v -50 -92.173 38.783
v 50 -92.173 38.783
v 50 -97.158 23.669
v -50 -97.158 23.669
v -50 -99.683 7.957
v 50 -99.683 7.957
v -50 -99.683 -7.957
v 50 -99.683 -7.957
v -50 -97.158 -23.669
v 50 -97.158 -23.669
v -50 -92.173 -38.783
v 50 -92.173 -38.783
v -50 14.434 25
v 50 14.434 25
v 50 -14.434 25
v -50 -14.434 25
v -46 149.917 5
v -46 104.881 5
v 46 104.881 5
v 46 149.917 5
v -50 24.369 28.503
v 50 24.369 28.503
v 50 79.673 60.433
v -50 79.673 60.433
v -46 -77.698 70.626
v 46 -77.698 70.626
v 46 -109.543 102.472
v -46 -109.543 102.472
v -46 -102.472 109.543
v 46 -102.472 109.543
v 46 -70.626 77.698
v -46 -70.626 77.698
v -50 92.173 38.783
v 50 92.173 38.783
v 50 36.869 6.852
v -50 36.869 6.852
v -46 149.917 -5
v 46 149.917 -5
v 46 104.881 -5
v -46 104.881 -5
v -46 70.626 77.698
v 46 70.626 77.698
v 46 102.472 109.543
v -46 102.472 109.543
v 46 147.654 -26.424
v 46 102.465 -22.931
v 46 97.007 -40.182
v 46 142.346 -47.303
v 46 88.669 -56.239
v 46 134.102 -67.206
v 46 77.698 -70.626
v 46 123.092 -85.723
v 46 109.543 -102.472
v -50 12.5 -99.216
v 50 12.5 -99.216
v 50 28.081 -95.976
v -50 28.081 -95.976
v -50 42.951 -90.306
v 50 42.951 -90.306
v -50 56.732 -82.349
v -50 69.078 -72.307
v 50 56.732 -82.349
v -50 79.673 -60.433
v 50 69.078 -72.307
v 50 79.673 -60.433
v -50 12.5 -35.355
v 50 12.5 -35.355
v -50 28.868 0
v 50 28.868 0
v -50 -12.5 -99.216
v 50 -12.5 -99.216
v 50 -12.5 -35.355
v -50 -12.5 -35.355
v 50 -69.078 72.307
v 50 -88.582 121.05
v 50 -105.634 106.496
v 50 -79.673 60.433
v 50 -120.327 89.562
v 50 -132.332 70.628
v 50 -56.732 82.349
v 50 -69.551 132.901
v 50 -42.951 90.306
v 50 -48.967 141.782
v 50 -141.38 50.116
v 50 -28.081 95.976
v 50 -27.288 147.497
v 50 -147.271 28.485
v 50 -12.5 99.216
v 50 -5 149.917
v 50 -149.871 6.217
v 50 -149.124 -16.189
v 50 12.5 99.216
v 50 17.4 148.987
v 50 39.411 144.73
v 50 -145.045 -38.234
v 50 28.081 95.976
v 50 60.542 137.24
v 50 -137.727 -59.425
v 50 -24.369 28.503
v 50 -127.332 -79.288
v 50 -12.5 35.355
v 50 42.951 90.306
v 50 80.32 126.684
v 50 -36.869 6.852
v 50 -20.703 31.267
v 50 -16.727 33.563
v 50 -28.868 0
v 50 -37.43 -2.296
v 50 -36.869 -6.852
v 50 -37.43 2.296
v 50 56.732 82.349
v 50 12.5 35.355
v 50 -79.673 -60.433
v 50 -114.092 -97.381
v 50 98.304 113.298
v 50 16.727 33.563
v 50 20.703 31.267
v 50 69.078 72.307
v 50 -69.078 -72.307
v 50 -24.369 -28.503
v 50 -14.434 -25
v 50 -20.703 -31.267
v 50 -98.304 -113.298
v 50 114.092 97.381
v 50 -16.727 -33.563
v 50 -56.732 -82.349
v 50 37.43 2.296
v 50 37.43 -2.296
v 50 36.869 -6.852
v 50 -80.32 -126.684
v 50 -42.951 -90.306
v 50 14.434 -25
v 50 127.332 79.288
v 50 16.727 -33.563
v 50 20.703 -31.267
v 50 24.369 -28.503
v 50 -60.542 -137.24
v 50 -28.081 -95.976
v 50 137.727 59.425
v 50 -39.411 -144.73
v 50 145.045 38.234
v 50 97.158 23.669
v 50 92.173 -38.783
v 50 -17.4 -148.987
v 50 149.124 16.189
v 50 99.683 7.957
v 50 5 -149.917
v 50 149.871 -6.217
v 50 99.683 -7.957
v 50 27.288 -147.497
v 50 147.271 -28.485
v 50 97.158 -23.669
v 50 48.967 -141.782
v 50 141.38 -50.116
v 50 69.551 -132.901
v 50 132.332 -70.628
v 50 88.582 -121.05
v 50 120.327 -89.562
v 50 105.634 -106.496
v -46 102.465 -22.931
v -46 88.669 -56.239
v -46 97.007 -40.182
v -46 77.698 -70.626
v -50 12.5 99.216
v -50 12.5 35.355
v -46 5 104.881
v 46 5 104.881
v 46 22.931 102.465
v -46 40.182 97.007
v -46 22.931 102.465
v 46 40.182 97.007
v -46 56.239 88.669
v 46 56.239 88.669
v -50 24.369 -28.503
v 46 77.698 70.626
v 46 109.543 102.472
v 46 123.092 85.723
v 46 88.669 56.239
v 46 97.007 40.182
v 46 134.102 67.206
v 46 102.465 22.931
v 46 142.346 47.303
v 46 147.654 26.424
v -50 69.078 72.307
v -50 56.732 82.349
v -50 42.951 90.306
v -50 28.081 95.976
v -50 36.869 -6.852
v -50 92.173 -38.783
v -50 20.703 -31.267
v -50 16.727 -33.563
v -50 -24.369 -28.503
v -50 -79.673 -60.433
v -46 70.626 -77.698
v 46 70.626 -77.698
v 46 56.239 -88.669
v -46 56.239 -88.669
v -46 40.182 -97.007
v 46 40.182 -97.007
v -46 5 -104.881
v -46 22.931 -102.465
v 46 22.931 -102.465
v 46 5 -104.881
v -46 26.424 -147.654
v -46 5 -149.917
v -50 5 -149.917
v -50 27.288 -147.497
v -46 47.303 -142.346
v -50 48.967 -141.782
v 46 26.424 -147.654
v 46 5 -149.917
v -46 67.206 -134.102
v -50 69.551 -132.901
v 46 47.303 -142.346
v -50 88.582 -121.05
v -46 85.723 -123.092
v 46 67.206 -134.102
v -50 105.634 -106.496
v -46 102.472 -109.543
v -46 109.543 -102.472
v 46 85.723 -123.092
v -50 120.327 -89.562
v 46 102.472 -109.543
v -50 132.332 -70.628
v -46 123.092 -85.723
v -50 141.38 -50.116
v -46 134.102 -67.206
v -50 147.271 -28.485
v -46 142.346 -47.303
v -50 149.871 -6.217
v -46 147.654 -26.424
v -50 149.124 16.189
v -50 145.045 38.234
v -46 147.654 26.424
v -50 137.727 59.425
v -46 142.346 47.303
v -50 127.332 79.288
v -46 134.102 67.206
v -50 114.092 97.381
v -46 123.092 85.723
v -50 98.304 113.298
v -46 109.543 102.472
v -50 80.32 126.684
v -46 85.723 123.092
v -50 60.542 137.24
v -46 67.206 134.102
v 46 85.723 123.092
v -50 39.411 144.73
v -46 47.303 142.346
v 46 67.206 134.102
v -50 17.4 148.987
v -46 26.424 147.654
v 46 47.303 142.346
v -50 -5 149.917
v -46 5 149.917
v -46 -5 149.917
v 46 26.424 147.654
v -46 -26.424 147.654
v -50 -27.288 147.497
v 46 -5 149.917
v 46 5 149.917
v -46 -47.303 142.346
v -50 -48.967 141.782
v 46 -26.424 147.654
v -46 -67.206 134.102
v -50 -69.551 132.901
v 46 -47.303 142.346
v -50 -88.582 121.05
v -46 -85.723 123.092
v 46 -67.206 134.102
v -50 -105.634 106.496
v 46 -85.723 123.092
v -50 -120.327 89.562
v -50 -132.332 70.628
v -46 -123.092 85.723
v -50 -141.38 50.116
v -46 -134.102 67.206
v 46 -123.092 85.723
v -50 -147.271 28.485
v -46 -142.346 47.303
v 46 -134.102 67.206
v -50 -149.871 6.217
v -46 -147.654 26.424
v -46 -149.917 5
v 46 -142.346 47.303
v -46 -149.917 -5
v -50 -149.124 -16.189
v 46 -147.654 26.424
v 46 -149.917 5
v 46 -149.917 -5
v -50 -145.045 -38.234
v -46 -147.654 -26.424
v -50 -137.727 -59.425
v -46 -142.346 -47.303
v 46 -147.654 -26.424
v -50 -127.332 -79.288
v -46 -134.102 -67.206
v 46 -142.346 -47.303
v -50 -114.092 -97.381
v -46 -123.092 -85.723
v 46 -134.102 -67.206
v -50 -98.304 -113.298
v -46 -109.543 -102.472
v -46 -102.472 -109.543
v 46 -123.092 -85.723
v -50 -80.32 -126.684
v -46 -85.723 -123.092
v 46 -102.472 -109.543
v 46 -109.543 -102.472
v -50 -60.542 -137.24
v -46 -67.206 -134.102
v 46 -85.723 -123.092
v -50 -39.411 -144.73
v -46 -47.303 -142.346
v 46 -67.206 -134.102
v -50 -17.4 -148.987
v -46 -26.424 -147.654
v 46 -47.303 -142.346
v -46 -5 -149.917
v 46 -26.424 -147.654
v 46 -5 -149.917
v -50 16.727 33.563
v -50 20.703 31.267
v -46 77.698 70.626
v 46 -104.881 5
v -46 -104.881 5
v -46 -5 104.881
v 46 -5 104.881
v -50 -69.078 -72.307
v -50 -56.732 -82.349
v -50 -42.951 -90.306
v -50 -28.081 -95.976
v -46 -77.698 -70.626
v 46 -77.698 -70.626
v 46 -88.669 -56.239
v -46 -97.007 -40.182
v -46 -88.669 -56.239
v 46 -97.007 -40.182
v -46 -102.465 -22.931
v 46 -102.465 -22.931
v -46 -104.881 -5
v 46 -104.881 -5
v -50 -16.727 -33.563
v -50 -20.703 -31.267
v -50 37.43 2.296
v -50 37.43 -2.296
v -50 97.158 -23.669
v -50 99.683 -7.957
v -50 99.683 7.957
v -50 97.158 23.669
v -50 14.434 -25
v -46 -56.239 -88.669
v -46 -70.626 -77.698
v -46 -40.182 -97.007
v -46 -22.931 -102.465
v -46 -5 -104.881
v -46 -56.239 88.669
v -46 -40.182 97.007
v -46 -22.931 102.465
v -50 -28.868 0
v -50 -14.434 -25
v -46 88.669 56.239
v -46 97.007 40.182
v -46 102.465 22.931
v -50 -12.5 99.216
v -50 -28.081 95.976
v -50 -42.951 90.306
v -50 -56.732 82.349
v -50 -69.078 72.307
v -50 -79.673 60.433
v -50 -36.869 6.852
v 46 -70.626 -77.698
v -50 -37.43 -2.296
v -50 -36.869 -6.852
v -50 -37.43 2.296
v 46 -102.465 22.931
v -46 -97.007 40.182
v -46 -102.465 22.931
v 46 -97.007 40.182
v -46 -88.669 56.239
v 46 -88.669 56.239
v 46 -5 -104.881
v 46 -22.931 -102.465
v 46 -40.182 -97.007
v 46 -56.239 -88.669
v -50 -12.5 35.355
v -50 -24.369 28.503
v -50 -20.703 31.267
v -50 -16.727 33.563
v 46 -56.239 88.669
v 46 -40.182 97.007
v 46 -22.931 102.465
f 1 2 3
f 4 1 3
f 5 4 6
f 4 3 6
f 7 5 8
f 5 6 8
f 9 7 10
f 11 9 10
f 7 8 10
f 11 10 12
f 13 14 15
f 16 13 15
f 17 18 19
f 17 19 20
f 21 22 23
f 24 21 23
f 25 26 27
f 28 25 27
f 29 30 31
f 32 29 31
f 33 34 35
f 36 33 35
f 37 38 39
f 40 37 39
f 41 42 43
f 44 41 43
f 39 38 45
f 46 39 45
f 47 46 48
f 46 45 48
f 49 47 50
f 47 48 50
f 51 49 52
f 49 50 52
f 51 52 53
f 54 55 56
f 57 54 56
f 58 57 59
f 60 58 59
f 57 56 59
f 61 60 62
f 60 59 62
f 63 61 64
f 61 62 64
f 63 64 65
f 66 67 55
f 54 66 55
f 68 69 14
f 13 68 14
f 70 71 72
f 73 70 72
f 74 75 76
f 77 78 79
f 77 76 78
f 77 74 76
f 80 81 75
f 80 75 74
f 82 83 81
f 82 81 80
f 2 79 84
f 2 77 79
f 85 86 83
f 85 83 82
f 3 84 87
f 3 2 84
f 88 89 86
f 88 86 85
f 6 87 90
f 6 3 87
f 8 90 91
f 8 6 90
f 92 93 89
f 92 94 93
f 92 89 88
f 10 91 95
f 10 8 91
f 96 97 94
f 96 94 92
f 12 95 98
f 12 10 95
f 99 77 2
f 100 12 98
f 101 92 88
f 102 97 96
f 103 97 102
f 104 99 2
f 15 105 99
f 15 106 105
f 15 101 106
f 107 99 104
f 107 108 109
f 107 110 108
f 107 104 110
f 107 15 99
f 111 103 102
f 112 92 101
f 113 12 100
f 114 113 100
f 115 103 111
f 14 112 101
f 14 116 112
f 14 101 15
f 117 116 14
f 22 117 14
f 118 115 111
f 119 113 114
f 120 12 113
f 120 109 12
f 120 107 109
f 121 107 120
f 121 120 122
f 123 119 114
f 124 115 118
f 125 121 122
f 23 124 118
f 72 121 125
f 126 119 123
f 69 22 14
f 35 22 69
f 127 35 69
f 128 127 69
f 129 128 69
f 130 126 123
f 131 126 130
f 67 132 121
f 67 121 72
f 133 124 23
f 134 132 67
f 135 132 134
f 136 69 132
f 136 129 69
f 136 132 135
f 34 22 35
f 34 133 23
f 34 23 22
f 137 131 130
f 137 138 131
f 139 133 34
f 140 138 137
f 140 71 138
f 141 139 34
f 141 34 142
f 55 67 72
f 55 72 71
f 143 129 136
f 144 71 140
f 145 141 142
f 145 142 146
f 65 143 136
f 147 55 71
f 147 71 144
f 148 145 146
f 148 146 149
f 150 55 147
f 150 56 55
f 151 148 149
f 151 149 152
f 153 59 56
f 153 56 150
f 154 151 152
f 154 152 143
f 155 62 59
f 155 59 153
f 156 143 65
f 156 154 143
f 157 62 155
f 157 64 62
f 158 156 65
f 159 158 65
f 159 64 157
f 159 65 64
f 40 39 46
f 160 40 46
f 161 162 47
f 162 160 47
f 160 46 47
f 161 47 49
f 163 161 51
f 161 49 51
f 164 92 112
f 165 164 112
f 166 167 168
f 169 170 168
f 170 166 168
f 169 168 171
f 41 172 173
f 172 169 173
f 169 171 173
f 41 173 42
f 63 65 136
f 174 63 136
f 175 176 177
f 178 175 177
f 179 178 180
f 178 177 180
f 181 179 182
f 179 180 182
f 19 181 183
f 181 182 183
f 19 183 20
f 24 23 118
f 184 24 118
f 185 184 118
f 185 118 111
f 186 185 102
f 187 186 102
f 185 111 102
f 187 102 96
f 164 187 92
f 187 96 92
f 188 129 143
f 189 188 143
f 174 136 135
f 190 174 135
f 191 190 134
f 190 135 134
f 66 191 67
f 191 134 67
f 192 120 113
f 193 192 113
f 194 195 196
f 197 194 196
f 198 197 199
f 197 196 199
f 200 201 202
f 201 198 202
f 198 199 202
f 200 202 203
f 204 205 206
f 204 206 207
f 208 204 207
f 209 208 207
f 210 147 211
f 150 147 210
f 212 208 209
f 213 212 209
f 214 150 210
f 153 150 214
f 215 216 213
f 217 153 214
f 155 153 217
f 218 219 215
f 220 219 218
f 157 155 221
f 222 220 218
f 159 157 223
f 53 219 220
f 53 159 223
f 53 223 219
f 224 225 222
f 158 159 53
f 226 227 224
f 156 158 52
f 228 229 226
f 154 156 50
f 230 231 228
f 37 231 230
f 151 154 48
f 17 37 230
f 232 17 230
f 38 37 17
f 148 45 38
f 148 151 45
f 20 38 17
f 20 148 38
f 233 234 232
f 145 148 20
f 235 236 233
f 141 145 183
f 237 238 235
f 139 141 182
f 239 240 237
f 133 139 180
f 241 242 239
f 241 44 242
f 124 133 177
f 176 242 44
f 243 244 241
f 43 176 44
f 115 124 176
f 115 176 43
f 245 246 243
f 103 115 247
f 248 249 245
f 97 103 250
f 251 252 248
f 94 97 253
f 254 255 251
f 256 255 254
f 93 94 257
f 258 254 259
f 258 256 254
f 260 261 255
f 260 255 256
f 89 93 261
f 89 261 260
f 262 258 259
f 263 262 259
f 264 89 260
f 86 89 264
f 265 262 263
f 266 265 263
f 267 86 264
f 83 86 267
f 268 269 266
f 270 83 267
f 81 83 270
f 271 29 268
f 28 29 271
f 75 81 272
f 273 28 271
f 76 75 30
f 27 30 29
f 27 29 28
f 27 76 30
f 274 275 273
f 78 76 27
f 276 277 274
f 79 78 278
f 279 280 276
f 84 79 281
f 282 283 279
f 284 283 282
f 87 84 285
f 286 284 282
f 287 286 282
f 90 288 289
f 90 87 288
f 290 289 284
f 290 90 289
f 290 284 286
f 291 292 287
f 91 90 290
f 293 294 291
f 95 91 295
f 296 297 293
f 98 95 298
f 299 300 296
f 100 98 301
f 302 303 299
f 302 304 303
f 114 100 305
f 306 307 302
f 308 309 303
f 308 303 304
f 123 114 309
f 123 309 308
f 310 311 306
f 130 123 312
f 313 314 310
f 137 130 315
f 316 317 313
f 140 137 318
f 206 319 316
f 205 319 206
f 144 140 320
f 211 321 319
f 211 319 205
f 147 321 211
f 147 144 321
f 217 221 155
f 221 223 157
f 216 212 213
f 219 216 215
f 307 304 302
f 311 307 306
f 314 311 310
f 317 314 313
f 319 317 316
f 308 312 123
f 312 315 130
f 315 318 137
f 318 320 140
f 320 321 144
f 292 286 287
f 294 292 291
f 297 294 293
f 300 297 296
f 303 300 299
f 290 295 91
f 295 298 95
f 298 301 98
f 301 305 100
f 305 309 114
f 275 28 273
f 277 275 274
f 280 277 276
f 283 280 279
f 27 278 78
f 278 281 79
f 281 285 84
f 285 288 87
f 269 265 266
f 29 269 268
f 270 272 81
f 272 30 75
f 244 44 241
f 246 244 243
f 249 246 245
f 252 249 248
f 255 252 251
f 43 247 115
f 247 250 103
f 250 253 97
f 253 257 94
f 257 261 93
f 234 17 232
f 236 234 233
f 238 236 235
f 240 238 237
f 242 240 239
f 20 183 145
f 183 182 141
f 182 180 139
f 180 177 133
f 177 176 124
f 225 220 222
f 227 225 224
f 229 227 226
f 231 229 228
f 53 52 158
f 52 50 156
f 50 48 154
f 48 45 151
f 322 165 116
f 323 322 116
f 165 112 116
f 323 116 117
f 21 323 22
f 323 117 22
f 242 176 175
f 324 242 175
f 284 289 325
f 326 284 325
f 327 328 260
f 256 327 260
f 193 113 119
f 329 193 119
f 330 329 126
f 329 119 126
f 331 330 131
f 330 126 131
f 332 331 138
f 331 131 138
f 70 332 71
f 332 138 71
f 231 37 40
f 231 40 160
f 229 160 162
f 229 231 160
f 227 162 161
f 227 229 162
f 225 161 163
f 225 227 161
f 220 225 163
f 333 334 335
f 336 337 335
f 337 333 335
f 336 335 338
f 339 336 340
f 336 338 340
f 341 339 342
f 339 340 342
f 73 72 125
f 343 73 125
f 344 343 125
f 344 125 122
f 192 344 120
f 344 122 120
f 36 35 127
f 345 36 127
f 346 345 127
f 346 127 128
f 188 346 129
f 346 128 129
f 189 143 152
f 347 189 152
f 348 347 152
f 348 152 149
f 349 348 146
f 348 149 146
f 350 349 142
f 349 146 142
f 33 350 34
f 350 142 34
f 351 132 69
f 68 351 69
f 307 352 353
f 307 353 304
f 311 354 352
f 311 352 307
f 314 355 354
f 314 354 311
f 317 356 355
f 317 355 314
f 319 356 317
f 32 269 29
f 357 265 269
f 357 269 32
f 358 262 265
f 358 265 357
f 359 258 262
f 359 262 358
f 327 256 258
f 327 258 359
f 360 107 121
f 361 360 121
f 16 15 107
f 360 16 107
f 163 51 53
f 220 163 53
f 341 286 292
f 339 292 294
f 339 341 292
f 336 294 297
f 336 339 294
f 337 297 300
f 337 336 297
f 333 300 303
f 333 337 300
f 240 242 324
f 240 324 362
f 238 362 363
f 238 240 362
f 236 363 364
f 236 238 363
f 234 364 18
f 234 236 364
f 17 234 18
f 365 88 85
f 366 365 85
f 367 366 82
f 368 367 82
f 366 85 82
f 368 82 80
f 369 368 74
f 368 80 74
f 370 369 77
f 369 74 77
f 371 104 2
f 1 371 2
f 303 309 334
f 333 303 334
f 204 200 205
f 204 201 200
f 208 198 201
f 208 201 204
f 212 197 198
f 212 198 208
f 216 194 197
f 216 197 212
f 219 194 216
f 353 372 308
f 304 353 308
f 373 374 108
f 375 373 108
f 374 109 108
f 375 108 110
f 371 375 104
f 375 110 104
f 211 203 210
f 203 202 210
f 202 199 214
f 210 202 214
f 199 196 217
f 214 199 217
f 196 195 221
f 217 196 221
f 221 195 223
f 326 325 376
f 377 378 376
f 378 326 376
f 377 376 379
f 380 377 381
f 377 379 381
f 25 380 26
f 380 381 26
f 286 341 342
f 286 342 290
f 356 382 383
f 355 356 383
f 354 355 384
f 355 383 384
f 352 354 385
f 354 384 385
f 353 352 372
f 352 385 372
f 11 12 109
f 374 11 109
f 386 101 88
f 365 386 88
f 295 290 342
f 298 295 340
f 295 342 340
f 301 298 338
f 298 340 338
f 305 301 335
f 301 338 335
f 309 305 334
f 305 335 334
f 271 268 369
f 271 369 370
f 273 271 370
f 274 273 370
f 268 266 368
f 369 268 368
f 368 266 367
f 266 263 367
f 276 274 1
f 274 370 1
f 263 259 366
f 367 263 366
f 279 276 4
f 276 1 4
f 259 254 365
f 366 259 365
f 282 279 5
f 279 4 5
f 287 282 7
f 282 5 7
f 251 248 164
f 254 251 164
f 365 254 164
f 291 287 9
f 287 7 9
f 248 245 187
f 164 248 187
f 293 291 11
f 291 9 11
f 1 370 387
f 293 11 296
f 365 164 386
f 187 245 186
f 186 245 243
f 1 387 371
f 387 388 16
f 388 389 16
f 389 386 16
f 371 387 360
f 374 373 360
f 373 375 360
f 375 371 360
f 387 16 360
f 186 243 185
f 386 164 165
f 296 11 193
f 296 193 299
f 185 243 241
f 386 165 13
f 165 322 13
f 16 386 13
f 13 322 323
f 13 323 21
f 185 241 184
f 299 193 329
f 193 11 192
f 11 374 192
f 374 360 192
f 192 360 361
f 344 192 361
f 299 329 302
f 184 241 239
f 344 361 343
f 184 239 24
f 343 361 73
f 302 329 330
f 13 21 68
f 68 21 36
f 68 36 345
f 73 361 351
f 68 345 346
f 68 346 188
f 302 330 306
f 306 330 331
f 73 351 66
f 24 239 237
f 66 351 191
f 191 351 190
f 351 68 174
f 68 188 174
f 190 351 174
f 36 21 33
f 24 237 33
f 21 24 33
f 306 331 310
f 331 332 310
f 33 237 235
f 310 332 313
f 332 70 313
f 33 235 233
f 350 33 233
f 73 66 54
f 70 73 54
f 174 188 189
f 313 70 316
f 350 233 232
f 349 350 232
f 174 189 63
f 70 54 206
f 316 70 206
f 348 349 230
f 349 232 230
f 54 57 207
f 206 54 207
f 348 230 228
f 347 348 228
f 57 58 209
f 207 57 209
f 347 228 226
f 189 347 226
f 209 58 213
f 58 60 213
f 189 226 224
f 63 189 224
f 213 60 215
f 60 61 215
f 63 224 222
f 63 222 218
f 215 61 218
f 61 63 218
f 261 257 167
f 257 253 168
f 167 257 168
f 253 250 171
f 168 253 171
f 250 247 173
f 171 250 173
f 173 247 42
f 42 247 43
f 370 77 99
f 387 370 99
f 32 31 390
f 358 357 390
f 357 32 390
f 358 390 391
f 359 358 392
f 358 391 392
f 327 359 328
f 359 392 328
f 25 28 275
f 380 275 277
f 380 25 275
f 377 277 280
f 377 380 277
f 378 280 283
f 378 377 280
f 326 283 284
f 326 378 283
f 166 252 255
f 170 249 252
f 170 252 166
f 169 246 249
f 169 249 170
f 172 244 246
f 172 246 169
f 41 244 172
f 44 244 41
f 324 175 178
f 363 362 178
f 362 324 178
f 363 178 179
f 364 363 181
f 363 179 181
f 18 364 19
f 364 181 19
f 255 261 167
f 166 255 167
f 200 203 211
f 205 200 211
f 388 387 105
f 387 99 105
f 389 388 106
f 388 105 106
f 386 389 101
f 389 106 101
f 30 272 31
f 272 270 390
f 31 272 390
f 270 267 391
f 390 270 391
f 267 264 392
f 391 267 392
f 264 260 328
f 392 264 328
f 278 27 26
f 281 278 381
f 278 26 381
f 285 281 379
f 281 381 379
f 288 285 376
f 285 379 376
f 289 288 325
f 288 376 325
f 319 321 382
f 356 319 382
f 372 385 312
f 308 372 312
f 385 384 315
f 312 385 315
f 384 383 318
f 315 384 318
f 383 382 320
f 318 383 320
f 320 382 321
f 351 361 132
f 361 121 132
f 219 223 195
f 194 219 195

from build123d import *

# Parameters (mm, degrees)
BOSS_EXTRUDE1_DEPTH = 50
SKETCH4_R           = 150
SKETCH4_R_2         = 100
BOSS_EXTRUDE3_DEPTH = 100
CUT_EXTRUDE1_DEPTH  = 120
SKETCH7_R           = 150
SKETCH7_R_2         = 105
BOSS_EXTRUDE6_DEPTH = 4


with BuildPart() as part:
    # Sketch2 → Boss-Extrude1 (new, symmetric)
    with BuildSketch(Plane.YZ):
        with BuildLine():
            Line((-24.368621785, -28.502987077), (-80.352540378, -60.825317547))
            Line((-80.352540378, -60.825317547), (-92.852540378, -39.174682453))
            Line((-92.852540378, -39.174682453), (-36.868621785, -6.852351982))
            ThreePointArc((-36.868621785, -6.852351982), (-37.5, 0), (-36.868621785, 6.852351982))
            Line((-36.868621785, 6.852351982), (-92.852540378, 39.174682453))
            Line((-92.852540378, 39.174682453), (-80.352540378, 60.825317547))
            Line((-80.352540378, 60.825317547), (-24.368621785, 28.502987077))
            ThreePointArc((-24.368621785, 28.502987077), (-18.75, 32.475952642), (-12.5, 35.355339059))
            Line((-12.5, 35.355339059), (-12.5, 100))
            Line((-12.5, 100), (12.5, 100))
            Line((12.5, 100), (12.5, 35.355339059))
            ThreePointArc((12.5, 35.355339059), (18.75, 32.475952642), (24.368621785, 28.502987077))
            Line((24.368621785, 28.502987077), (80.352540378, 60.825317547))
            Line((80.352540378, 60.825317547), (92.852540378, 39.174682453))
            Line((92.852540378, 39.174682453), (36.868621785, 6.852351982))
            ThreePointArc((36.868621785, 6.852351982), (37.5, 0), (36.868621785, -6.852351982))
            Line((36.868621785, -6.852351982), (92.852540378, -39.174682453))
            Line((92.852540378, -39.174682453), (80.352540378, -60.825317547))
            Line((80.352540378, -60.825317547), (24.368621785, -28.502987077))
            ThreePointArc((24.368621785, -28.502987077), (18.75, -32.475952642), (12.5, -35.355339059))
            Line((12.5, -35.355339059), (12.5, -100))
            Line((12.5, -100), (-12.5, -100))
            Line((-12.5, -100), (-12.5, -35.355339059))
            ThreePointArc((-12.5, -35.355339059), (-18.75, -32.475952642), (-24.368621785, -28.502987077))
        make_face()
        Polygon((-14.43375673, -25), (14.43375673, -25), (28.867513459, 0), (14.43375673, 25), (-14.43375673, 25), (-28.867513459, 0), align=None, mode=Mode.SUBTRACT)
    extrude(amount=BOSS_EXTRUDE1_DEPTH, both=True)

    # Sketch4 → Boss-Extrude3 (add)
    with BuildSketch(Plane.YZ.offset(50)):
        with Locations(Location((0, 0, 0), (0, 0, 270))):
            Circle(SKETCH4_R)
        Circle(SKETCH4_R_2, mode=Mode.SUBTRACT)
    extrude(amount=-BOSS_EXTRUDE3_DEPTH)

    # Sketch5 → Cut-Extrude1 (cut)
    with BuildSketch(Plane.YZ.offset(50)):
        with BuildLine():
            ThreePointArc((-70.626450965, 77.697518777), (-40.181760398, 97.007350914), (-5, 104.880884817))
            Line((-5, 104.880884817), (-5, 149.916643506))
            ThreePointArc((-5, 149.916643506), (-57.402514855, 138.581929877), (-102.47154133, 109.542609142))
            Line((-102.47154133, 109.542609142), (-70.626450965, 77.697518777))
        make_face()
        with BuildLine():
            Line((70.626450965, 77.697518777), (102.47154133, 109.542609142))
            ThreePointArc((102.47154133, 109.542609142), (57.402514855, 138.581929877), (5, 149.916643506))
            Line((5, 149.916643506), (5, 104.880884817))
            ThreePointArc((5, 104.880884817), (40.181760398, 97.007350914), (70.626450965, 77.697518777))
        make_face()
        with BuildLine():
            ThreePointArc((149.916643506, 5), (138.581929877, 57.402514855), (109.542609142, 102.47154133))
            Line((109.542609142, 102.47154133), (77.697518777, 70.626450965))
            ThreePointArc((77.697518777, 70.626450965), (97.007350914, 40.181760398), (104.880884817, 5))
            Line((104.880884817, 5), (149.916643506, 5))
        make_face()
        with BuildLine():
            Line((149.916643506, -5), (104.880884817, -5))
            ThreePointArc((104.880884817, -5), (97.007350914, -40.181760398), (77.697518777, -70.626450965))
            Line((77.697518777, -70.626450965), (109.542609142, -102.47154133))
            ThreePointArc((109.542609142, -102.47154133), (138.581929877, -57.402514855), (149.916643506, -5))
        make_face()
        with BuildLine():
            Line((102.47154133, -109.542609142), (70.626450965, -77.697518777))
            ThreePointArc((70.626450965, -77.697518777), (40.181760398, -97.007350914), (5, -104.880884817))
            Line((5, -104.880884817), (5, -149.916643506))
            ThreePointArc((5, -149.916643506), (57.402514855, -138.581929877), (102.47154133, -109.542609142))
        make_face()
        with BuildLine():
            Line((-5, -149.916643506), (-5, -104.880884817))
            ThreePointArc((-5, -104.880884817), (-40.181760398, -97.007350914), (-70.626450965, -77.697518777))
            Line((-70.626450965, -77.697518777), (-102.47154133, -109.542609142))
            ThreePointArc((-102.47154133, -109.542609142), (-57.402514855, -138.581929877), (-5, -149.916643506))
        make_face()
        with BuildLine():
            ThreePointArc((-77.697518777, -70.626450965), (-97.007350914, -40.181760398), (-104.880884817, -5))
            Line((-104.880884817, -5), (-149.916643506, -5))
            ThreePointArc((-149.916643506, -5), (-138.581929877, -57.402514855), (-109.542609142, -102.47154133))
            Line((-109.542609142, -102.47154133), (-77.697518777, -70.626450965))
        make_face()
        with BuildLine():
            ThreePointArc((-104.880884817, 5), (-97.007350914, 40.181760398), (-77.697518777, 70.626450965))
            Line((-77.697518777, 70.626450965), (-109.542609142, 102.47154133))
            ThreePointArc((-109.542609142, 102.47154133), (-138.581929877, 57.402514855), (-149.916643506, 5))
            Line((-149.916643506, 5), (-104.880884817, 5))
        make_face()
    extrude(amount=-CUT_EXTRUDE1_DEPTH, mode=Mode.SUBTRACT)

    # Sketch7 → Boss-Extrude6 (add)
    with BuildSketch(Plane.YZ.offset(50)):
        with Locations(Location((0, 0, 0), (0, 0, 270))):
            Circle(SKETCH7_R)
        Circle(SKETCH7_R_2, mode=Mode.SUBTRACT)
    boss_extrude6 = extrude(amount=-BOSS_EXTRUDE6_DEPTH)

    # Mirror2: Boss-Extrude6 across plane
    add(boss_extrude6.mirror(Plane(origin=(0, 0, 0), x_dir=(0, 0, 1), z_dir=(1, 0, 0))))


solid = part.part
